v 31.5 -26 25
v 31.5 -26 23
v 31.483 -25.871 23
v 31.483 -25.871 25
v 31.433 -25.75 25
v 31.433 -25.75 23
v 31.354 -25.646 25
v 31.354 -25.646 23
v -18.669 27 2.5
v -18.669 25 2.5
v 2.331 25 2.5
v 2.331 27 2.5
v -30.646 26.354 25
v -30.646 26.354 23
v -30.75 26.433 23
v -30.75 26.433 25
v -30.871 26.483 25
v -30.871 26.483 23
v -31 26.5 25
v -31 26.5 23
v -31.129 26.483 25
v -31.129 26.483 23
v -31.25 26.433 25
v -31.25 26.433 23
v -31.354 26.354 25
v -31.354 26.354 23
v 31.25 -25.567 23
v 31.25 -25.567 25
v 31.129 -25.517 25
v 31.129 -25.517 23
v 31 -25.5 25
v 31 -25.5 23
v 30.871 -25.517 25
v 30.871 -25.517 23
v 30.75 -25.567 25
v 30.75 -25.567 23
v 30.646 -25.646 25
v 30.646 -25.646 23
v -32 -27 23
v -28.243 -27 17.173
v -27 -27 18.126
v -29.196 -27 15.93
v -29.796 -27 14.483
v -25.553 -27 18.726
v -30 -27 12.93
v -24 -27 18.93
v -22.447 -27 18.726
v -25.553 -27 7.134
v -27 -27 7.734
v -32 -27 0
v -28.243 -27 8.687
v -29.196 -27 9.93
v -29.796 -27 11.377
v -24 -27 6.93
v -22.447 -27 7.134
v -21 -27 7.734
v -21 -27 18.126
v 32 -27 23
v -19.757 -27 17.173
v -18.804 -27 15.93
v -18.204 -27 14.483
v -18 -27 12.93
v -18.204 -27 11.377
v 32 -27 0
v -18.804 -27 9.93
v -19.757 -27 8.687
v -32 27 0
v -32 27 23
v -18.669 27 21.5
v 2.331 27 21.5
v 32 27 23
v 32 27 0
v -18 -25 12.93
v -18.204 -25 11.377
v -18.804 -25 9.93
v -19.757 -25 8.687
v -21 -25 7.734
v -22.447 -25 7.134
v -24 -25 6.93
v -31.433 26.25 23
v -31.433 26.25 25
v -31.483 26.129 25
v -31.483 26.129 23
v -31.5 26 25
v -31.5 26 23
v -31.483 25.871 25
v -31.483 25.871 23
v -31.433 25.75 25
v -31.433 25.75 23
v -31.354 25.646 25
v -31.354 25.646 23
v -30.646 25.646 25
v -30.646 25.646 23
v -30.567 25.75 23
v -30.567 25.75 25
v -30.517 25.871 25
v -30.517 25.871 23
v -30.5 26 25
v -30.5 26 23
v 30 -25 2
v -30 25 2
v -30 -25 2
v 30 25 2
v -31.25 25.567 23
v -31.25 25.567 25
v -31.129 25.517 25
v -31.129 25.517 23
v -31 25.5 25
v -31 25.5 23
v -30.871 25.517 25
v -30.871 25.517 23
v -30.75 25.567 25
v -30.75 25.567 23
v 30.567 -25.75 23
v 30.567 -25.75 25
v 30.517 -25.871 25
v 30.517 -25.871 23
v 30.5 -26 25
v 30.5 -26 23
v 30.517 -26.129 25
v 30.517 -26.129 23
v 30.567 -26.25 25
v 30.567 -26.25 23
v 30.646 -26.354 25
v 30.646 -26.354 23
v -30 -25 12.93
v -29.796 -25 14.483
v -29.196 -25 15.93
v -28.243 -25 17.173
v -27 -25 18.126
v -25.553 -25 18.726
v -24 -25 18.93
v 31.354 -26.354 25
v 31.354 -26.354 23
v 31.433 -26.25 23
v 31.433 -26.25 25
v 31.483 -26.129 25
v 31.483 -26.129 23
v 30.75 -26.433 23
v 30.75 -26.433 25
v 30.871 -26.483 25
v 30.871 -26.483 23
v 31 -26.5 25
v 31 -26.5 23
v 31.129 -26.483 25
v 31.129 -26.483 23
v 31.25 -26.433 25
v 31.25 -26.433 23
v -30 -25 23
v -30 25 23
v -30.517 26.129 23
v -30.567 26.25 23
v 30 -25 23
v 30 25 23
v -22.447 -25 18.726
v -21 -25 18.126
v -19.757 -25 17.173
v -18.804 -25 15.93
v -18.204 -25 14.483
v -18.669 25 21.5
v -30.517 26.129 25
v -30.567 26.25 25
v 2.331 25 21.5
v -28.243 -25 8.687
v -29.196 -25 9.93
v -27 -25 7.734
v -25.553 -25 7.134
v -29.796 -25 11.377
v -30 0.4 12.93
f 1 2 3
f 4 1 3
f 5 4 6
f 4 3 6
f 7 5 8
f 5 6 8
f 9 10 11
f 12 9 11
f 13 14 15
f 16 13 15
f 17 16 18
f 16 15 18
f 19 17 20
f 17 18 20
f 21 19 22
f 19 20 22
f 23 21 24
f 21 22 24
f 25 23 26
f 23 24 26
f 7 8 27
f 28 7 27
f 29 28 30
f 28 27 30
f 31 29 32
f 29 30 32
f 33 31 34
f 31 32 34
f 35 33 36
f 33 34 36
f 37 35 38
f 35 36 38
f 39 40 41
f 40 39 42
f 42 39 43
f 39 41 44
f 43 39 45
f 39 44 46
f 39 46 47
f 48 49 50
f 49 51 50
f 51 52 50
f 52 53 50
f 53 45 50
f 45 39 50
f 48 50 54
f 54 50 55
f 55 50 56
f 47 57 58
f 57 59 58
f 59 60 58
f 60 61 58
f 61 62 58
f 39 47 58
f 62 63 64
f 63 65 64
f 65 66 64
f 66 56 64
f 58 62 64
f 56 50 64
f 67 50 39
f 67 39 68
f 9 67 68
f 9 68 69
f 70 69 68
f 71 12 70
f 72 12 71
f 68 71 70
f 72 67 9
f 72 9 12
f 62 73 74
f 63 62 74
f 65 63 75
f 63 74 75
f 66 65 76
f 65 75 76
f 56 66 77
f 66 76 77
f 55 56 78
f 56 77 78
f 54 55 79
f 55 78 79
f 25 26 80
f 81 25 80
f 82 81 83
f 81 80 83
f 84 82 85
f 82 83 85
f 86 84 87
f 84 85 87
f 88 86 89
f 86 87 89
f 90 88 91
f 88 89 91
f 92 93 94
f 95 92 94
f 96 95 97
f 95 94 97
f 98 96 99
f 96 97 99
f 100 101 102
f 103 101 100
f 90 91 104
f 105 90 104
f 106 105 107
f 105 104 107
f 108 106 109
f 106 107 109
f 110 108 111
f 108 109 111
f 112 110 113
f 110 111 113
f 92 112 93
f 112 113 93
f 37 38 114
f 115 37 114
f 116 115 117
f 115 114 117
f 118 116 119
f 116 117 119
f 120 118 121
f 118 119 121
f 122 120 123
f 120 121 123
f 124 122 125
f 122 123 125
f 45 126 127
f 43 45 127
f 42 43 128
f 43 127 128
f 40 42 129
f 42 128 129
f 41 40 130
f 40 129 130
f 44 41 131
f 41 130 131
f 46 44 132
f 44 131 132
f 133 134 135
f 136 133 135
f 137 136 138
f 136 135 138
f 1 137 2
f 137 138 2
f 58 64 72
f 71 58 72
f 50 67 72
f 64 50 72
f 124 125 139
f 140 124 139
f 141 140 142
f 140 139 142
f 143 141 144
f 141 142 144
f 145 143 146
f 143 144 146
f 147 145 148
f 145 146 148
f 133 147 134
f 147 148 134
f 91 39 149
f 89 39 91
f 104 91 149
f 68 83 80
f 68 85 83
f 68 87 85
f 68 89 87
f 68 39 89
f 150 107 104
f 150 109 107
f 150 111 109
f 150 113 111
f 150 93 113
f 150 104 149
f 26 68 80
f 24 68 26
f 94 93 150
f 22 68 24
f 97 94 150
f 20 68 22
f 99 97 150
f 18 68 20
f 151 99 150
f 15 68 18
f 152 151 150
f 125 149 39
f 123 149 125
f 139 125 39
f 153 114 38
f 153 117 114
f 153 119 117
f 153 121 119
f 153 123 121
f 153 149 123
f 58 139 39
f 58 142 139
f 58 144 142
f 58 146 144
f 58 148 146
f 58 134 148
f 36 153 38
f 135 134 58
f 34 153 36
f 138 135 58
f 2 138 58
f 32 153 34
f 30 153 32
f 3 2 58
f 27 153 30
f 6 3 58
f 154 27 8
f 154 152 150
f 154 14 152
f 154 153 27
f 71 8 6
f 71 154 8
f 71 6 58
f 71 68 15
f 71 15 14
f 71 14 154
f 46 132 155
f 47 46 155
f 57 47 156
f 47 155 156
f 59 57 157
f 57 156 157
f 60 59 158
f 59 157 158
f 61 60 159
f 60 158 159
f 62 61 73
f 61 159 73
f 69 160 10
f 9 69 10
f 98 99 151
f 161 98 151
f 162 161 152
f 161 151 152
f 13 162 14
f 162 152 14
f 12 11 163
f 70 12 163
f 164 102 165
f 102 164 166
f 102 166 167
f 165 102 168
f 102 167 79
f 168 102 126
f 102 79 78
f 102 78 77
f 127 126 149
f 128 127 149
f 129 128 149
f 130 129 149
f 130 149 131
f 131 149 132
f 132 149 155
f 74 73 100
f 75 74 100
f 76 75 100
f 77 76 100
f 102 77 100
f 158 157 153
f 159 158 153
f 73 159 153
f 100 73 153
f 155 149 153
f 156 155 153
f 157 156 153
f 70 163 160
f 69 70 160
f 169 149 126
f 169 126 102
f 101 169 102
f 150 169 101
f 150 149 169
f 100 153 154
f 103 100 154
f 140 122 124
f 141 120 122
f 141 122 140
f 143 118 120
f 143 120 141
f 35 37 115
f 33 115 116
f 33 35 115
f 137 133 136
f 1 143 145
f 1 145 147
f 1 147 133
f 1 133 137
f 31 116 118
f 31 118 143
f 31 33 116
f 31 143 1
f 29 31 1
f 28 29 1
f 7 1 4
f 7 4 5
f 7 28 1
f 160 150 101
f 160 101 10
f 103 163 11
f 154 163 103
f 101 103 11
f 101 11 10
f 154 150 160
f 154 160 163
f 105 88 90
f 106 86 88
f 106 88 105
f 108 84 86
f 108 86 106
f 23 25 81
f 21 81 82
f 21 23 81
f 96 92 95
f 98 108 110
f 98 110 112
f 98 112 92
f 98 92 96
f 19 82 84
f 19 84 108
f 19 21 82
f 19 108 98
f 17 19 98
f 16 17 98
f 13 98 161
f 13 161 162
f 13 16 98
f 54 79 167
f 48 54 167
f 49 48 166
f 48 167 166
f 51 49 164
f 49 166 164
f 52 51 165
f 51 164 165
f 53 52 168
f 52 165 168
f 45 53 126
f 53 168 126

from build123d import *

# Parameters (mm, degrees)
F0_W          = 64
F0_H          = 54
F1_DEPTH      = 23
F2_W          = 60
F2_H          = 50
F3_DEPTH      = 21
F5_DEPTH      = 25.4
F5_DEPTH_BACK = 25.4
F7_DEPTH      = 25.4
F7_DEPTH_BACK = 25.4
F11_DEPTH     = 2
F13_DEPTH     = 2


with BuildPart() as f1:
    # F0 (on Top) → F1 (new body)
    with BuildSketch(Plane.XY):
        Rectangle(F0_W, F0_H)
    extrude(amount=F1_DEPTH)

    # F2 (on face) → F3 (cut)
    with BuildSketch(Plane.XY.offset(23)):
        Rectangle(F2_W, F2_H)
    extrude(amount=-F3_DEPTH, mode=Mode.SUBTRACT)

    # F4 (on face) → F5 (cut, two sides)
    with BuildSketch(Plane(origin=(0, -25, 0), x_dir=(-1, 0, 0), z_dir=(0, 1, 0))) as f5_sk:
        with BuildLine():
            ThreePointArc((24, 6.93), (28.2426406871, 8.6873593129), (30, 12.93))
            ThreePointArc((30, 12.93), (28.2426406871, 17.1726406871), (24, 18.93))
            ThreePointArc((24, 18.93), (19.7573593129, 17.1726406871), (18, 12.93))
            ThreePointArc((18, 12.93), (19.7573593129, 8.6873593129), (24, 6.93))
        make_face()
    extrude(amount=-F5_DEPTH, mode=Mode.SUBTRACT)
    extrude(f5_sk.sketch, amount=F5_DEPTH_BACK, mode=Mode.SUBTRACT)

    # F6 (on face) → F7 (cut, two sides)
    with BuildSketch(Plane.XZ.offset(-25)) as f7_sk:
        Polygon((-18.6692412496, 2.5), (-8.1692412496, 2.5), (2.3307587504, 2.5), (2.3307587504, 21.5), (-18.6692412496, 21.5), align=None)
    extrude(amount=-F7_DEPTH, mode=Mode.SUBTRACT)
    extrude(f7_sk.sketch, amount=F7_DEPTH_BACK, mode=Mode.SUBTRACT)

    # F10 (on face) → F11 (join)
    with BuildSketch(Plane.XY.offset(23)):
        with BuildLine():
            Line((-30.6464466094, 26.3535533906), (-31, 26))
            Line((-31, 26), (-30.6464466094, 25.6464466094))
            ThreePointArc((-30.6464466094, 25.6464466094), (-30.5380602337, 25.8086582838), (-30.5, 26))
            ThreePointArc((-30.5, 26), (-30.5380602337, 26.1913417162), (-30.6464466094, 26.3535533906))
        make_face()
        with BuildLine():
            ThreePointArc((-30.6464466094, 26.3535533906), (-31, 26.5), (-31.3535533906, 26.3535533906))
            Line((-31.3535533906, 26.3535533906), (-31, 26))
            Line((-31, 26), (-30.6464466094, 26.3535533906))
        make_face()
        with BuildLine():
            Line((-31, 26), (-31.3535533906, 26.3535533906))
            ThreePointArc((-31.3535533906, 26.3535533906), (-31.5, 26), (-31.3535533906, 25.6464466094))
            Line((-31.3535533906, 25.6464466094), (-31, 26))
        make_face()
        with BuildLine():
            Line((-30.6464466094, 25.6464466094), (-31, 26))
            Line((-31, 26), (-31.3535533906, 25.6464466094))
            ThreePointArc((-31.3535533906, 25.6464466094), (-31, 25.5), (-30.6464466094, 25.6464466094))
        make_face()
    extrude(amount=F11_DEPTH)

    # F12 (on face) → F13 (join)
    with BuildSketch(Plane.XY.offset(23)):
        with BuildLine():
            Line((31, -26), (30.6464466094, -25.6464466094))
            ThreePointArc((30.6464466094, -25.6464466094), (30.5, -26), (30.6464466094, -26.3535533906))
            Line((30.6464466094, -26.3535533906), (31, -26))
        make_face()
        with BuildLine():
            ThreePointArc((31.3535533906, -25.6464466094), (31, -25.5), (30.6464466094, -25.6464466094))
            Line((30.6464466094, -25.6464466094), (31, -26))
            Line((31, -26), (31.3535533906, -25.6464466094))
        make_face()
        with BuildLine():
            Line((31.3535533906, -25.6464466094), (31, -26))
            Line((31, -26), (31.3535533906, -26.3535533906))
            ThreePointArc((31.3535533906, -26.3535533906), (31.4619397663, -26.1913417162), (31.5, -26))
            ThreePointArc((31.5, -26), (31.4619397663, -25.8086582838), (31.3535533906, -25.6464466094))
        make_face()
        with BuildLine():
            Line((31.3535533906, -26.3535533906), (31, -26))
            Line((31, -26), (30.6464466094, -26.3535533906))
            ThreePointArc((30.6464466094, -26.3535533906), (31, -26.5), (31.3535533906, -26.3535533906))
        make_face()
    extrude(amount=F13_DEPTH)


solid = f1.part
